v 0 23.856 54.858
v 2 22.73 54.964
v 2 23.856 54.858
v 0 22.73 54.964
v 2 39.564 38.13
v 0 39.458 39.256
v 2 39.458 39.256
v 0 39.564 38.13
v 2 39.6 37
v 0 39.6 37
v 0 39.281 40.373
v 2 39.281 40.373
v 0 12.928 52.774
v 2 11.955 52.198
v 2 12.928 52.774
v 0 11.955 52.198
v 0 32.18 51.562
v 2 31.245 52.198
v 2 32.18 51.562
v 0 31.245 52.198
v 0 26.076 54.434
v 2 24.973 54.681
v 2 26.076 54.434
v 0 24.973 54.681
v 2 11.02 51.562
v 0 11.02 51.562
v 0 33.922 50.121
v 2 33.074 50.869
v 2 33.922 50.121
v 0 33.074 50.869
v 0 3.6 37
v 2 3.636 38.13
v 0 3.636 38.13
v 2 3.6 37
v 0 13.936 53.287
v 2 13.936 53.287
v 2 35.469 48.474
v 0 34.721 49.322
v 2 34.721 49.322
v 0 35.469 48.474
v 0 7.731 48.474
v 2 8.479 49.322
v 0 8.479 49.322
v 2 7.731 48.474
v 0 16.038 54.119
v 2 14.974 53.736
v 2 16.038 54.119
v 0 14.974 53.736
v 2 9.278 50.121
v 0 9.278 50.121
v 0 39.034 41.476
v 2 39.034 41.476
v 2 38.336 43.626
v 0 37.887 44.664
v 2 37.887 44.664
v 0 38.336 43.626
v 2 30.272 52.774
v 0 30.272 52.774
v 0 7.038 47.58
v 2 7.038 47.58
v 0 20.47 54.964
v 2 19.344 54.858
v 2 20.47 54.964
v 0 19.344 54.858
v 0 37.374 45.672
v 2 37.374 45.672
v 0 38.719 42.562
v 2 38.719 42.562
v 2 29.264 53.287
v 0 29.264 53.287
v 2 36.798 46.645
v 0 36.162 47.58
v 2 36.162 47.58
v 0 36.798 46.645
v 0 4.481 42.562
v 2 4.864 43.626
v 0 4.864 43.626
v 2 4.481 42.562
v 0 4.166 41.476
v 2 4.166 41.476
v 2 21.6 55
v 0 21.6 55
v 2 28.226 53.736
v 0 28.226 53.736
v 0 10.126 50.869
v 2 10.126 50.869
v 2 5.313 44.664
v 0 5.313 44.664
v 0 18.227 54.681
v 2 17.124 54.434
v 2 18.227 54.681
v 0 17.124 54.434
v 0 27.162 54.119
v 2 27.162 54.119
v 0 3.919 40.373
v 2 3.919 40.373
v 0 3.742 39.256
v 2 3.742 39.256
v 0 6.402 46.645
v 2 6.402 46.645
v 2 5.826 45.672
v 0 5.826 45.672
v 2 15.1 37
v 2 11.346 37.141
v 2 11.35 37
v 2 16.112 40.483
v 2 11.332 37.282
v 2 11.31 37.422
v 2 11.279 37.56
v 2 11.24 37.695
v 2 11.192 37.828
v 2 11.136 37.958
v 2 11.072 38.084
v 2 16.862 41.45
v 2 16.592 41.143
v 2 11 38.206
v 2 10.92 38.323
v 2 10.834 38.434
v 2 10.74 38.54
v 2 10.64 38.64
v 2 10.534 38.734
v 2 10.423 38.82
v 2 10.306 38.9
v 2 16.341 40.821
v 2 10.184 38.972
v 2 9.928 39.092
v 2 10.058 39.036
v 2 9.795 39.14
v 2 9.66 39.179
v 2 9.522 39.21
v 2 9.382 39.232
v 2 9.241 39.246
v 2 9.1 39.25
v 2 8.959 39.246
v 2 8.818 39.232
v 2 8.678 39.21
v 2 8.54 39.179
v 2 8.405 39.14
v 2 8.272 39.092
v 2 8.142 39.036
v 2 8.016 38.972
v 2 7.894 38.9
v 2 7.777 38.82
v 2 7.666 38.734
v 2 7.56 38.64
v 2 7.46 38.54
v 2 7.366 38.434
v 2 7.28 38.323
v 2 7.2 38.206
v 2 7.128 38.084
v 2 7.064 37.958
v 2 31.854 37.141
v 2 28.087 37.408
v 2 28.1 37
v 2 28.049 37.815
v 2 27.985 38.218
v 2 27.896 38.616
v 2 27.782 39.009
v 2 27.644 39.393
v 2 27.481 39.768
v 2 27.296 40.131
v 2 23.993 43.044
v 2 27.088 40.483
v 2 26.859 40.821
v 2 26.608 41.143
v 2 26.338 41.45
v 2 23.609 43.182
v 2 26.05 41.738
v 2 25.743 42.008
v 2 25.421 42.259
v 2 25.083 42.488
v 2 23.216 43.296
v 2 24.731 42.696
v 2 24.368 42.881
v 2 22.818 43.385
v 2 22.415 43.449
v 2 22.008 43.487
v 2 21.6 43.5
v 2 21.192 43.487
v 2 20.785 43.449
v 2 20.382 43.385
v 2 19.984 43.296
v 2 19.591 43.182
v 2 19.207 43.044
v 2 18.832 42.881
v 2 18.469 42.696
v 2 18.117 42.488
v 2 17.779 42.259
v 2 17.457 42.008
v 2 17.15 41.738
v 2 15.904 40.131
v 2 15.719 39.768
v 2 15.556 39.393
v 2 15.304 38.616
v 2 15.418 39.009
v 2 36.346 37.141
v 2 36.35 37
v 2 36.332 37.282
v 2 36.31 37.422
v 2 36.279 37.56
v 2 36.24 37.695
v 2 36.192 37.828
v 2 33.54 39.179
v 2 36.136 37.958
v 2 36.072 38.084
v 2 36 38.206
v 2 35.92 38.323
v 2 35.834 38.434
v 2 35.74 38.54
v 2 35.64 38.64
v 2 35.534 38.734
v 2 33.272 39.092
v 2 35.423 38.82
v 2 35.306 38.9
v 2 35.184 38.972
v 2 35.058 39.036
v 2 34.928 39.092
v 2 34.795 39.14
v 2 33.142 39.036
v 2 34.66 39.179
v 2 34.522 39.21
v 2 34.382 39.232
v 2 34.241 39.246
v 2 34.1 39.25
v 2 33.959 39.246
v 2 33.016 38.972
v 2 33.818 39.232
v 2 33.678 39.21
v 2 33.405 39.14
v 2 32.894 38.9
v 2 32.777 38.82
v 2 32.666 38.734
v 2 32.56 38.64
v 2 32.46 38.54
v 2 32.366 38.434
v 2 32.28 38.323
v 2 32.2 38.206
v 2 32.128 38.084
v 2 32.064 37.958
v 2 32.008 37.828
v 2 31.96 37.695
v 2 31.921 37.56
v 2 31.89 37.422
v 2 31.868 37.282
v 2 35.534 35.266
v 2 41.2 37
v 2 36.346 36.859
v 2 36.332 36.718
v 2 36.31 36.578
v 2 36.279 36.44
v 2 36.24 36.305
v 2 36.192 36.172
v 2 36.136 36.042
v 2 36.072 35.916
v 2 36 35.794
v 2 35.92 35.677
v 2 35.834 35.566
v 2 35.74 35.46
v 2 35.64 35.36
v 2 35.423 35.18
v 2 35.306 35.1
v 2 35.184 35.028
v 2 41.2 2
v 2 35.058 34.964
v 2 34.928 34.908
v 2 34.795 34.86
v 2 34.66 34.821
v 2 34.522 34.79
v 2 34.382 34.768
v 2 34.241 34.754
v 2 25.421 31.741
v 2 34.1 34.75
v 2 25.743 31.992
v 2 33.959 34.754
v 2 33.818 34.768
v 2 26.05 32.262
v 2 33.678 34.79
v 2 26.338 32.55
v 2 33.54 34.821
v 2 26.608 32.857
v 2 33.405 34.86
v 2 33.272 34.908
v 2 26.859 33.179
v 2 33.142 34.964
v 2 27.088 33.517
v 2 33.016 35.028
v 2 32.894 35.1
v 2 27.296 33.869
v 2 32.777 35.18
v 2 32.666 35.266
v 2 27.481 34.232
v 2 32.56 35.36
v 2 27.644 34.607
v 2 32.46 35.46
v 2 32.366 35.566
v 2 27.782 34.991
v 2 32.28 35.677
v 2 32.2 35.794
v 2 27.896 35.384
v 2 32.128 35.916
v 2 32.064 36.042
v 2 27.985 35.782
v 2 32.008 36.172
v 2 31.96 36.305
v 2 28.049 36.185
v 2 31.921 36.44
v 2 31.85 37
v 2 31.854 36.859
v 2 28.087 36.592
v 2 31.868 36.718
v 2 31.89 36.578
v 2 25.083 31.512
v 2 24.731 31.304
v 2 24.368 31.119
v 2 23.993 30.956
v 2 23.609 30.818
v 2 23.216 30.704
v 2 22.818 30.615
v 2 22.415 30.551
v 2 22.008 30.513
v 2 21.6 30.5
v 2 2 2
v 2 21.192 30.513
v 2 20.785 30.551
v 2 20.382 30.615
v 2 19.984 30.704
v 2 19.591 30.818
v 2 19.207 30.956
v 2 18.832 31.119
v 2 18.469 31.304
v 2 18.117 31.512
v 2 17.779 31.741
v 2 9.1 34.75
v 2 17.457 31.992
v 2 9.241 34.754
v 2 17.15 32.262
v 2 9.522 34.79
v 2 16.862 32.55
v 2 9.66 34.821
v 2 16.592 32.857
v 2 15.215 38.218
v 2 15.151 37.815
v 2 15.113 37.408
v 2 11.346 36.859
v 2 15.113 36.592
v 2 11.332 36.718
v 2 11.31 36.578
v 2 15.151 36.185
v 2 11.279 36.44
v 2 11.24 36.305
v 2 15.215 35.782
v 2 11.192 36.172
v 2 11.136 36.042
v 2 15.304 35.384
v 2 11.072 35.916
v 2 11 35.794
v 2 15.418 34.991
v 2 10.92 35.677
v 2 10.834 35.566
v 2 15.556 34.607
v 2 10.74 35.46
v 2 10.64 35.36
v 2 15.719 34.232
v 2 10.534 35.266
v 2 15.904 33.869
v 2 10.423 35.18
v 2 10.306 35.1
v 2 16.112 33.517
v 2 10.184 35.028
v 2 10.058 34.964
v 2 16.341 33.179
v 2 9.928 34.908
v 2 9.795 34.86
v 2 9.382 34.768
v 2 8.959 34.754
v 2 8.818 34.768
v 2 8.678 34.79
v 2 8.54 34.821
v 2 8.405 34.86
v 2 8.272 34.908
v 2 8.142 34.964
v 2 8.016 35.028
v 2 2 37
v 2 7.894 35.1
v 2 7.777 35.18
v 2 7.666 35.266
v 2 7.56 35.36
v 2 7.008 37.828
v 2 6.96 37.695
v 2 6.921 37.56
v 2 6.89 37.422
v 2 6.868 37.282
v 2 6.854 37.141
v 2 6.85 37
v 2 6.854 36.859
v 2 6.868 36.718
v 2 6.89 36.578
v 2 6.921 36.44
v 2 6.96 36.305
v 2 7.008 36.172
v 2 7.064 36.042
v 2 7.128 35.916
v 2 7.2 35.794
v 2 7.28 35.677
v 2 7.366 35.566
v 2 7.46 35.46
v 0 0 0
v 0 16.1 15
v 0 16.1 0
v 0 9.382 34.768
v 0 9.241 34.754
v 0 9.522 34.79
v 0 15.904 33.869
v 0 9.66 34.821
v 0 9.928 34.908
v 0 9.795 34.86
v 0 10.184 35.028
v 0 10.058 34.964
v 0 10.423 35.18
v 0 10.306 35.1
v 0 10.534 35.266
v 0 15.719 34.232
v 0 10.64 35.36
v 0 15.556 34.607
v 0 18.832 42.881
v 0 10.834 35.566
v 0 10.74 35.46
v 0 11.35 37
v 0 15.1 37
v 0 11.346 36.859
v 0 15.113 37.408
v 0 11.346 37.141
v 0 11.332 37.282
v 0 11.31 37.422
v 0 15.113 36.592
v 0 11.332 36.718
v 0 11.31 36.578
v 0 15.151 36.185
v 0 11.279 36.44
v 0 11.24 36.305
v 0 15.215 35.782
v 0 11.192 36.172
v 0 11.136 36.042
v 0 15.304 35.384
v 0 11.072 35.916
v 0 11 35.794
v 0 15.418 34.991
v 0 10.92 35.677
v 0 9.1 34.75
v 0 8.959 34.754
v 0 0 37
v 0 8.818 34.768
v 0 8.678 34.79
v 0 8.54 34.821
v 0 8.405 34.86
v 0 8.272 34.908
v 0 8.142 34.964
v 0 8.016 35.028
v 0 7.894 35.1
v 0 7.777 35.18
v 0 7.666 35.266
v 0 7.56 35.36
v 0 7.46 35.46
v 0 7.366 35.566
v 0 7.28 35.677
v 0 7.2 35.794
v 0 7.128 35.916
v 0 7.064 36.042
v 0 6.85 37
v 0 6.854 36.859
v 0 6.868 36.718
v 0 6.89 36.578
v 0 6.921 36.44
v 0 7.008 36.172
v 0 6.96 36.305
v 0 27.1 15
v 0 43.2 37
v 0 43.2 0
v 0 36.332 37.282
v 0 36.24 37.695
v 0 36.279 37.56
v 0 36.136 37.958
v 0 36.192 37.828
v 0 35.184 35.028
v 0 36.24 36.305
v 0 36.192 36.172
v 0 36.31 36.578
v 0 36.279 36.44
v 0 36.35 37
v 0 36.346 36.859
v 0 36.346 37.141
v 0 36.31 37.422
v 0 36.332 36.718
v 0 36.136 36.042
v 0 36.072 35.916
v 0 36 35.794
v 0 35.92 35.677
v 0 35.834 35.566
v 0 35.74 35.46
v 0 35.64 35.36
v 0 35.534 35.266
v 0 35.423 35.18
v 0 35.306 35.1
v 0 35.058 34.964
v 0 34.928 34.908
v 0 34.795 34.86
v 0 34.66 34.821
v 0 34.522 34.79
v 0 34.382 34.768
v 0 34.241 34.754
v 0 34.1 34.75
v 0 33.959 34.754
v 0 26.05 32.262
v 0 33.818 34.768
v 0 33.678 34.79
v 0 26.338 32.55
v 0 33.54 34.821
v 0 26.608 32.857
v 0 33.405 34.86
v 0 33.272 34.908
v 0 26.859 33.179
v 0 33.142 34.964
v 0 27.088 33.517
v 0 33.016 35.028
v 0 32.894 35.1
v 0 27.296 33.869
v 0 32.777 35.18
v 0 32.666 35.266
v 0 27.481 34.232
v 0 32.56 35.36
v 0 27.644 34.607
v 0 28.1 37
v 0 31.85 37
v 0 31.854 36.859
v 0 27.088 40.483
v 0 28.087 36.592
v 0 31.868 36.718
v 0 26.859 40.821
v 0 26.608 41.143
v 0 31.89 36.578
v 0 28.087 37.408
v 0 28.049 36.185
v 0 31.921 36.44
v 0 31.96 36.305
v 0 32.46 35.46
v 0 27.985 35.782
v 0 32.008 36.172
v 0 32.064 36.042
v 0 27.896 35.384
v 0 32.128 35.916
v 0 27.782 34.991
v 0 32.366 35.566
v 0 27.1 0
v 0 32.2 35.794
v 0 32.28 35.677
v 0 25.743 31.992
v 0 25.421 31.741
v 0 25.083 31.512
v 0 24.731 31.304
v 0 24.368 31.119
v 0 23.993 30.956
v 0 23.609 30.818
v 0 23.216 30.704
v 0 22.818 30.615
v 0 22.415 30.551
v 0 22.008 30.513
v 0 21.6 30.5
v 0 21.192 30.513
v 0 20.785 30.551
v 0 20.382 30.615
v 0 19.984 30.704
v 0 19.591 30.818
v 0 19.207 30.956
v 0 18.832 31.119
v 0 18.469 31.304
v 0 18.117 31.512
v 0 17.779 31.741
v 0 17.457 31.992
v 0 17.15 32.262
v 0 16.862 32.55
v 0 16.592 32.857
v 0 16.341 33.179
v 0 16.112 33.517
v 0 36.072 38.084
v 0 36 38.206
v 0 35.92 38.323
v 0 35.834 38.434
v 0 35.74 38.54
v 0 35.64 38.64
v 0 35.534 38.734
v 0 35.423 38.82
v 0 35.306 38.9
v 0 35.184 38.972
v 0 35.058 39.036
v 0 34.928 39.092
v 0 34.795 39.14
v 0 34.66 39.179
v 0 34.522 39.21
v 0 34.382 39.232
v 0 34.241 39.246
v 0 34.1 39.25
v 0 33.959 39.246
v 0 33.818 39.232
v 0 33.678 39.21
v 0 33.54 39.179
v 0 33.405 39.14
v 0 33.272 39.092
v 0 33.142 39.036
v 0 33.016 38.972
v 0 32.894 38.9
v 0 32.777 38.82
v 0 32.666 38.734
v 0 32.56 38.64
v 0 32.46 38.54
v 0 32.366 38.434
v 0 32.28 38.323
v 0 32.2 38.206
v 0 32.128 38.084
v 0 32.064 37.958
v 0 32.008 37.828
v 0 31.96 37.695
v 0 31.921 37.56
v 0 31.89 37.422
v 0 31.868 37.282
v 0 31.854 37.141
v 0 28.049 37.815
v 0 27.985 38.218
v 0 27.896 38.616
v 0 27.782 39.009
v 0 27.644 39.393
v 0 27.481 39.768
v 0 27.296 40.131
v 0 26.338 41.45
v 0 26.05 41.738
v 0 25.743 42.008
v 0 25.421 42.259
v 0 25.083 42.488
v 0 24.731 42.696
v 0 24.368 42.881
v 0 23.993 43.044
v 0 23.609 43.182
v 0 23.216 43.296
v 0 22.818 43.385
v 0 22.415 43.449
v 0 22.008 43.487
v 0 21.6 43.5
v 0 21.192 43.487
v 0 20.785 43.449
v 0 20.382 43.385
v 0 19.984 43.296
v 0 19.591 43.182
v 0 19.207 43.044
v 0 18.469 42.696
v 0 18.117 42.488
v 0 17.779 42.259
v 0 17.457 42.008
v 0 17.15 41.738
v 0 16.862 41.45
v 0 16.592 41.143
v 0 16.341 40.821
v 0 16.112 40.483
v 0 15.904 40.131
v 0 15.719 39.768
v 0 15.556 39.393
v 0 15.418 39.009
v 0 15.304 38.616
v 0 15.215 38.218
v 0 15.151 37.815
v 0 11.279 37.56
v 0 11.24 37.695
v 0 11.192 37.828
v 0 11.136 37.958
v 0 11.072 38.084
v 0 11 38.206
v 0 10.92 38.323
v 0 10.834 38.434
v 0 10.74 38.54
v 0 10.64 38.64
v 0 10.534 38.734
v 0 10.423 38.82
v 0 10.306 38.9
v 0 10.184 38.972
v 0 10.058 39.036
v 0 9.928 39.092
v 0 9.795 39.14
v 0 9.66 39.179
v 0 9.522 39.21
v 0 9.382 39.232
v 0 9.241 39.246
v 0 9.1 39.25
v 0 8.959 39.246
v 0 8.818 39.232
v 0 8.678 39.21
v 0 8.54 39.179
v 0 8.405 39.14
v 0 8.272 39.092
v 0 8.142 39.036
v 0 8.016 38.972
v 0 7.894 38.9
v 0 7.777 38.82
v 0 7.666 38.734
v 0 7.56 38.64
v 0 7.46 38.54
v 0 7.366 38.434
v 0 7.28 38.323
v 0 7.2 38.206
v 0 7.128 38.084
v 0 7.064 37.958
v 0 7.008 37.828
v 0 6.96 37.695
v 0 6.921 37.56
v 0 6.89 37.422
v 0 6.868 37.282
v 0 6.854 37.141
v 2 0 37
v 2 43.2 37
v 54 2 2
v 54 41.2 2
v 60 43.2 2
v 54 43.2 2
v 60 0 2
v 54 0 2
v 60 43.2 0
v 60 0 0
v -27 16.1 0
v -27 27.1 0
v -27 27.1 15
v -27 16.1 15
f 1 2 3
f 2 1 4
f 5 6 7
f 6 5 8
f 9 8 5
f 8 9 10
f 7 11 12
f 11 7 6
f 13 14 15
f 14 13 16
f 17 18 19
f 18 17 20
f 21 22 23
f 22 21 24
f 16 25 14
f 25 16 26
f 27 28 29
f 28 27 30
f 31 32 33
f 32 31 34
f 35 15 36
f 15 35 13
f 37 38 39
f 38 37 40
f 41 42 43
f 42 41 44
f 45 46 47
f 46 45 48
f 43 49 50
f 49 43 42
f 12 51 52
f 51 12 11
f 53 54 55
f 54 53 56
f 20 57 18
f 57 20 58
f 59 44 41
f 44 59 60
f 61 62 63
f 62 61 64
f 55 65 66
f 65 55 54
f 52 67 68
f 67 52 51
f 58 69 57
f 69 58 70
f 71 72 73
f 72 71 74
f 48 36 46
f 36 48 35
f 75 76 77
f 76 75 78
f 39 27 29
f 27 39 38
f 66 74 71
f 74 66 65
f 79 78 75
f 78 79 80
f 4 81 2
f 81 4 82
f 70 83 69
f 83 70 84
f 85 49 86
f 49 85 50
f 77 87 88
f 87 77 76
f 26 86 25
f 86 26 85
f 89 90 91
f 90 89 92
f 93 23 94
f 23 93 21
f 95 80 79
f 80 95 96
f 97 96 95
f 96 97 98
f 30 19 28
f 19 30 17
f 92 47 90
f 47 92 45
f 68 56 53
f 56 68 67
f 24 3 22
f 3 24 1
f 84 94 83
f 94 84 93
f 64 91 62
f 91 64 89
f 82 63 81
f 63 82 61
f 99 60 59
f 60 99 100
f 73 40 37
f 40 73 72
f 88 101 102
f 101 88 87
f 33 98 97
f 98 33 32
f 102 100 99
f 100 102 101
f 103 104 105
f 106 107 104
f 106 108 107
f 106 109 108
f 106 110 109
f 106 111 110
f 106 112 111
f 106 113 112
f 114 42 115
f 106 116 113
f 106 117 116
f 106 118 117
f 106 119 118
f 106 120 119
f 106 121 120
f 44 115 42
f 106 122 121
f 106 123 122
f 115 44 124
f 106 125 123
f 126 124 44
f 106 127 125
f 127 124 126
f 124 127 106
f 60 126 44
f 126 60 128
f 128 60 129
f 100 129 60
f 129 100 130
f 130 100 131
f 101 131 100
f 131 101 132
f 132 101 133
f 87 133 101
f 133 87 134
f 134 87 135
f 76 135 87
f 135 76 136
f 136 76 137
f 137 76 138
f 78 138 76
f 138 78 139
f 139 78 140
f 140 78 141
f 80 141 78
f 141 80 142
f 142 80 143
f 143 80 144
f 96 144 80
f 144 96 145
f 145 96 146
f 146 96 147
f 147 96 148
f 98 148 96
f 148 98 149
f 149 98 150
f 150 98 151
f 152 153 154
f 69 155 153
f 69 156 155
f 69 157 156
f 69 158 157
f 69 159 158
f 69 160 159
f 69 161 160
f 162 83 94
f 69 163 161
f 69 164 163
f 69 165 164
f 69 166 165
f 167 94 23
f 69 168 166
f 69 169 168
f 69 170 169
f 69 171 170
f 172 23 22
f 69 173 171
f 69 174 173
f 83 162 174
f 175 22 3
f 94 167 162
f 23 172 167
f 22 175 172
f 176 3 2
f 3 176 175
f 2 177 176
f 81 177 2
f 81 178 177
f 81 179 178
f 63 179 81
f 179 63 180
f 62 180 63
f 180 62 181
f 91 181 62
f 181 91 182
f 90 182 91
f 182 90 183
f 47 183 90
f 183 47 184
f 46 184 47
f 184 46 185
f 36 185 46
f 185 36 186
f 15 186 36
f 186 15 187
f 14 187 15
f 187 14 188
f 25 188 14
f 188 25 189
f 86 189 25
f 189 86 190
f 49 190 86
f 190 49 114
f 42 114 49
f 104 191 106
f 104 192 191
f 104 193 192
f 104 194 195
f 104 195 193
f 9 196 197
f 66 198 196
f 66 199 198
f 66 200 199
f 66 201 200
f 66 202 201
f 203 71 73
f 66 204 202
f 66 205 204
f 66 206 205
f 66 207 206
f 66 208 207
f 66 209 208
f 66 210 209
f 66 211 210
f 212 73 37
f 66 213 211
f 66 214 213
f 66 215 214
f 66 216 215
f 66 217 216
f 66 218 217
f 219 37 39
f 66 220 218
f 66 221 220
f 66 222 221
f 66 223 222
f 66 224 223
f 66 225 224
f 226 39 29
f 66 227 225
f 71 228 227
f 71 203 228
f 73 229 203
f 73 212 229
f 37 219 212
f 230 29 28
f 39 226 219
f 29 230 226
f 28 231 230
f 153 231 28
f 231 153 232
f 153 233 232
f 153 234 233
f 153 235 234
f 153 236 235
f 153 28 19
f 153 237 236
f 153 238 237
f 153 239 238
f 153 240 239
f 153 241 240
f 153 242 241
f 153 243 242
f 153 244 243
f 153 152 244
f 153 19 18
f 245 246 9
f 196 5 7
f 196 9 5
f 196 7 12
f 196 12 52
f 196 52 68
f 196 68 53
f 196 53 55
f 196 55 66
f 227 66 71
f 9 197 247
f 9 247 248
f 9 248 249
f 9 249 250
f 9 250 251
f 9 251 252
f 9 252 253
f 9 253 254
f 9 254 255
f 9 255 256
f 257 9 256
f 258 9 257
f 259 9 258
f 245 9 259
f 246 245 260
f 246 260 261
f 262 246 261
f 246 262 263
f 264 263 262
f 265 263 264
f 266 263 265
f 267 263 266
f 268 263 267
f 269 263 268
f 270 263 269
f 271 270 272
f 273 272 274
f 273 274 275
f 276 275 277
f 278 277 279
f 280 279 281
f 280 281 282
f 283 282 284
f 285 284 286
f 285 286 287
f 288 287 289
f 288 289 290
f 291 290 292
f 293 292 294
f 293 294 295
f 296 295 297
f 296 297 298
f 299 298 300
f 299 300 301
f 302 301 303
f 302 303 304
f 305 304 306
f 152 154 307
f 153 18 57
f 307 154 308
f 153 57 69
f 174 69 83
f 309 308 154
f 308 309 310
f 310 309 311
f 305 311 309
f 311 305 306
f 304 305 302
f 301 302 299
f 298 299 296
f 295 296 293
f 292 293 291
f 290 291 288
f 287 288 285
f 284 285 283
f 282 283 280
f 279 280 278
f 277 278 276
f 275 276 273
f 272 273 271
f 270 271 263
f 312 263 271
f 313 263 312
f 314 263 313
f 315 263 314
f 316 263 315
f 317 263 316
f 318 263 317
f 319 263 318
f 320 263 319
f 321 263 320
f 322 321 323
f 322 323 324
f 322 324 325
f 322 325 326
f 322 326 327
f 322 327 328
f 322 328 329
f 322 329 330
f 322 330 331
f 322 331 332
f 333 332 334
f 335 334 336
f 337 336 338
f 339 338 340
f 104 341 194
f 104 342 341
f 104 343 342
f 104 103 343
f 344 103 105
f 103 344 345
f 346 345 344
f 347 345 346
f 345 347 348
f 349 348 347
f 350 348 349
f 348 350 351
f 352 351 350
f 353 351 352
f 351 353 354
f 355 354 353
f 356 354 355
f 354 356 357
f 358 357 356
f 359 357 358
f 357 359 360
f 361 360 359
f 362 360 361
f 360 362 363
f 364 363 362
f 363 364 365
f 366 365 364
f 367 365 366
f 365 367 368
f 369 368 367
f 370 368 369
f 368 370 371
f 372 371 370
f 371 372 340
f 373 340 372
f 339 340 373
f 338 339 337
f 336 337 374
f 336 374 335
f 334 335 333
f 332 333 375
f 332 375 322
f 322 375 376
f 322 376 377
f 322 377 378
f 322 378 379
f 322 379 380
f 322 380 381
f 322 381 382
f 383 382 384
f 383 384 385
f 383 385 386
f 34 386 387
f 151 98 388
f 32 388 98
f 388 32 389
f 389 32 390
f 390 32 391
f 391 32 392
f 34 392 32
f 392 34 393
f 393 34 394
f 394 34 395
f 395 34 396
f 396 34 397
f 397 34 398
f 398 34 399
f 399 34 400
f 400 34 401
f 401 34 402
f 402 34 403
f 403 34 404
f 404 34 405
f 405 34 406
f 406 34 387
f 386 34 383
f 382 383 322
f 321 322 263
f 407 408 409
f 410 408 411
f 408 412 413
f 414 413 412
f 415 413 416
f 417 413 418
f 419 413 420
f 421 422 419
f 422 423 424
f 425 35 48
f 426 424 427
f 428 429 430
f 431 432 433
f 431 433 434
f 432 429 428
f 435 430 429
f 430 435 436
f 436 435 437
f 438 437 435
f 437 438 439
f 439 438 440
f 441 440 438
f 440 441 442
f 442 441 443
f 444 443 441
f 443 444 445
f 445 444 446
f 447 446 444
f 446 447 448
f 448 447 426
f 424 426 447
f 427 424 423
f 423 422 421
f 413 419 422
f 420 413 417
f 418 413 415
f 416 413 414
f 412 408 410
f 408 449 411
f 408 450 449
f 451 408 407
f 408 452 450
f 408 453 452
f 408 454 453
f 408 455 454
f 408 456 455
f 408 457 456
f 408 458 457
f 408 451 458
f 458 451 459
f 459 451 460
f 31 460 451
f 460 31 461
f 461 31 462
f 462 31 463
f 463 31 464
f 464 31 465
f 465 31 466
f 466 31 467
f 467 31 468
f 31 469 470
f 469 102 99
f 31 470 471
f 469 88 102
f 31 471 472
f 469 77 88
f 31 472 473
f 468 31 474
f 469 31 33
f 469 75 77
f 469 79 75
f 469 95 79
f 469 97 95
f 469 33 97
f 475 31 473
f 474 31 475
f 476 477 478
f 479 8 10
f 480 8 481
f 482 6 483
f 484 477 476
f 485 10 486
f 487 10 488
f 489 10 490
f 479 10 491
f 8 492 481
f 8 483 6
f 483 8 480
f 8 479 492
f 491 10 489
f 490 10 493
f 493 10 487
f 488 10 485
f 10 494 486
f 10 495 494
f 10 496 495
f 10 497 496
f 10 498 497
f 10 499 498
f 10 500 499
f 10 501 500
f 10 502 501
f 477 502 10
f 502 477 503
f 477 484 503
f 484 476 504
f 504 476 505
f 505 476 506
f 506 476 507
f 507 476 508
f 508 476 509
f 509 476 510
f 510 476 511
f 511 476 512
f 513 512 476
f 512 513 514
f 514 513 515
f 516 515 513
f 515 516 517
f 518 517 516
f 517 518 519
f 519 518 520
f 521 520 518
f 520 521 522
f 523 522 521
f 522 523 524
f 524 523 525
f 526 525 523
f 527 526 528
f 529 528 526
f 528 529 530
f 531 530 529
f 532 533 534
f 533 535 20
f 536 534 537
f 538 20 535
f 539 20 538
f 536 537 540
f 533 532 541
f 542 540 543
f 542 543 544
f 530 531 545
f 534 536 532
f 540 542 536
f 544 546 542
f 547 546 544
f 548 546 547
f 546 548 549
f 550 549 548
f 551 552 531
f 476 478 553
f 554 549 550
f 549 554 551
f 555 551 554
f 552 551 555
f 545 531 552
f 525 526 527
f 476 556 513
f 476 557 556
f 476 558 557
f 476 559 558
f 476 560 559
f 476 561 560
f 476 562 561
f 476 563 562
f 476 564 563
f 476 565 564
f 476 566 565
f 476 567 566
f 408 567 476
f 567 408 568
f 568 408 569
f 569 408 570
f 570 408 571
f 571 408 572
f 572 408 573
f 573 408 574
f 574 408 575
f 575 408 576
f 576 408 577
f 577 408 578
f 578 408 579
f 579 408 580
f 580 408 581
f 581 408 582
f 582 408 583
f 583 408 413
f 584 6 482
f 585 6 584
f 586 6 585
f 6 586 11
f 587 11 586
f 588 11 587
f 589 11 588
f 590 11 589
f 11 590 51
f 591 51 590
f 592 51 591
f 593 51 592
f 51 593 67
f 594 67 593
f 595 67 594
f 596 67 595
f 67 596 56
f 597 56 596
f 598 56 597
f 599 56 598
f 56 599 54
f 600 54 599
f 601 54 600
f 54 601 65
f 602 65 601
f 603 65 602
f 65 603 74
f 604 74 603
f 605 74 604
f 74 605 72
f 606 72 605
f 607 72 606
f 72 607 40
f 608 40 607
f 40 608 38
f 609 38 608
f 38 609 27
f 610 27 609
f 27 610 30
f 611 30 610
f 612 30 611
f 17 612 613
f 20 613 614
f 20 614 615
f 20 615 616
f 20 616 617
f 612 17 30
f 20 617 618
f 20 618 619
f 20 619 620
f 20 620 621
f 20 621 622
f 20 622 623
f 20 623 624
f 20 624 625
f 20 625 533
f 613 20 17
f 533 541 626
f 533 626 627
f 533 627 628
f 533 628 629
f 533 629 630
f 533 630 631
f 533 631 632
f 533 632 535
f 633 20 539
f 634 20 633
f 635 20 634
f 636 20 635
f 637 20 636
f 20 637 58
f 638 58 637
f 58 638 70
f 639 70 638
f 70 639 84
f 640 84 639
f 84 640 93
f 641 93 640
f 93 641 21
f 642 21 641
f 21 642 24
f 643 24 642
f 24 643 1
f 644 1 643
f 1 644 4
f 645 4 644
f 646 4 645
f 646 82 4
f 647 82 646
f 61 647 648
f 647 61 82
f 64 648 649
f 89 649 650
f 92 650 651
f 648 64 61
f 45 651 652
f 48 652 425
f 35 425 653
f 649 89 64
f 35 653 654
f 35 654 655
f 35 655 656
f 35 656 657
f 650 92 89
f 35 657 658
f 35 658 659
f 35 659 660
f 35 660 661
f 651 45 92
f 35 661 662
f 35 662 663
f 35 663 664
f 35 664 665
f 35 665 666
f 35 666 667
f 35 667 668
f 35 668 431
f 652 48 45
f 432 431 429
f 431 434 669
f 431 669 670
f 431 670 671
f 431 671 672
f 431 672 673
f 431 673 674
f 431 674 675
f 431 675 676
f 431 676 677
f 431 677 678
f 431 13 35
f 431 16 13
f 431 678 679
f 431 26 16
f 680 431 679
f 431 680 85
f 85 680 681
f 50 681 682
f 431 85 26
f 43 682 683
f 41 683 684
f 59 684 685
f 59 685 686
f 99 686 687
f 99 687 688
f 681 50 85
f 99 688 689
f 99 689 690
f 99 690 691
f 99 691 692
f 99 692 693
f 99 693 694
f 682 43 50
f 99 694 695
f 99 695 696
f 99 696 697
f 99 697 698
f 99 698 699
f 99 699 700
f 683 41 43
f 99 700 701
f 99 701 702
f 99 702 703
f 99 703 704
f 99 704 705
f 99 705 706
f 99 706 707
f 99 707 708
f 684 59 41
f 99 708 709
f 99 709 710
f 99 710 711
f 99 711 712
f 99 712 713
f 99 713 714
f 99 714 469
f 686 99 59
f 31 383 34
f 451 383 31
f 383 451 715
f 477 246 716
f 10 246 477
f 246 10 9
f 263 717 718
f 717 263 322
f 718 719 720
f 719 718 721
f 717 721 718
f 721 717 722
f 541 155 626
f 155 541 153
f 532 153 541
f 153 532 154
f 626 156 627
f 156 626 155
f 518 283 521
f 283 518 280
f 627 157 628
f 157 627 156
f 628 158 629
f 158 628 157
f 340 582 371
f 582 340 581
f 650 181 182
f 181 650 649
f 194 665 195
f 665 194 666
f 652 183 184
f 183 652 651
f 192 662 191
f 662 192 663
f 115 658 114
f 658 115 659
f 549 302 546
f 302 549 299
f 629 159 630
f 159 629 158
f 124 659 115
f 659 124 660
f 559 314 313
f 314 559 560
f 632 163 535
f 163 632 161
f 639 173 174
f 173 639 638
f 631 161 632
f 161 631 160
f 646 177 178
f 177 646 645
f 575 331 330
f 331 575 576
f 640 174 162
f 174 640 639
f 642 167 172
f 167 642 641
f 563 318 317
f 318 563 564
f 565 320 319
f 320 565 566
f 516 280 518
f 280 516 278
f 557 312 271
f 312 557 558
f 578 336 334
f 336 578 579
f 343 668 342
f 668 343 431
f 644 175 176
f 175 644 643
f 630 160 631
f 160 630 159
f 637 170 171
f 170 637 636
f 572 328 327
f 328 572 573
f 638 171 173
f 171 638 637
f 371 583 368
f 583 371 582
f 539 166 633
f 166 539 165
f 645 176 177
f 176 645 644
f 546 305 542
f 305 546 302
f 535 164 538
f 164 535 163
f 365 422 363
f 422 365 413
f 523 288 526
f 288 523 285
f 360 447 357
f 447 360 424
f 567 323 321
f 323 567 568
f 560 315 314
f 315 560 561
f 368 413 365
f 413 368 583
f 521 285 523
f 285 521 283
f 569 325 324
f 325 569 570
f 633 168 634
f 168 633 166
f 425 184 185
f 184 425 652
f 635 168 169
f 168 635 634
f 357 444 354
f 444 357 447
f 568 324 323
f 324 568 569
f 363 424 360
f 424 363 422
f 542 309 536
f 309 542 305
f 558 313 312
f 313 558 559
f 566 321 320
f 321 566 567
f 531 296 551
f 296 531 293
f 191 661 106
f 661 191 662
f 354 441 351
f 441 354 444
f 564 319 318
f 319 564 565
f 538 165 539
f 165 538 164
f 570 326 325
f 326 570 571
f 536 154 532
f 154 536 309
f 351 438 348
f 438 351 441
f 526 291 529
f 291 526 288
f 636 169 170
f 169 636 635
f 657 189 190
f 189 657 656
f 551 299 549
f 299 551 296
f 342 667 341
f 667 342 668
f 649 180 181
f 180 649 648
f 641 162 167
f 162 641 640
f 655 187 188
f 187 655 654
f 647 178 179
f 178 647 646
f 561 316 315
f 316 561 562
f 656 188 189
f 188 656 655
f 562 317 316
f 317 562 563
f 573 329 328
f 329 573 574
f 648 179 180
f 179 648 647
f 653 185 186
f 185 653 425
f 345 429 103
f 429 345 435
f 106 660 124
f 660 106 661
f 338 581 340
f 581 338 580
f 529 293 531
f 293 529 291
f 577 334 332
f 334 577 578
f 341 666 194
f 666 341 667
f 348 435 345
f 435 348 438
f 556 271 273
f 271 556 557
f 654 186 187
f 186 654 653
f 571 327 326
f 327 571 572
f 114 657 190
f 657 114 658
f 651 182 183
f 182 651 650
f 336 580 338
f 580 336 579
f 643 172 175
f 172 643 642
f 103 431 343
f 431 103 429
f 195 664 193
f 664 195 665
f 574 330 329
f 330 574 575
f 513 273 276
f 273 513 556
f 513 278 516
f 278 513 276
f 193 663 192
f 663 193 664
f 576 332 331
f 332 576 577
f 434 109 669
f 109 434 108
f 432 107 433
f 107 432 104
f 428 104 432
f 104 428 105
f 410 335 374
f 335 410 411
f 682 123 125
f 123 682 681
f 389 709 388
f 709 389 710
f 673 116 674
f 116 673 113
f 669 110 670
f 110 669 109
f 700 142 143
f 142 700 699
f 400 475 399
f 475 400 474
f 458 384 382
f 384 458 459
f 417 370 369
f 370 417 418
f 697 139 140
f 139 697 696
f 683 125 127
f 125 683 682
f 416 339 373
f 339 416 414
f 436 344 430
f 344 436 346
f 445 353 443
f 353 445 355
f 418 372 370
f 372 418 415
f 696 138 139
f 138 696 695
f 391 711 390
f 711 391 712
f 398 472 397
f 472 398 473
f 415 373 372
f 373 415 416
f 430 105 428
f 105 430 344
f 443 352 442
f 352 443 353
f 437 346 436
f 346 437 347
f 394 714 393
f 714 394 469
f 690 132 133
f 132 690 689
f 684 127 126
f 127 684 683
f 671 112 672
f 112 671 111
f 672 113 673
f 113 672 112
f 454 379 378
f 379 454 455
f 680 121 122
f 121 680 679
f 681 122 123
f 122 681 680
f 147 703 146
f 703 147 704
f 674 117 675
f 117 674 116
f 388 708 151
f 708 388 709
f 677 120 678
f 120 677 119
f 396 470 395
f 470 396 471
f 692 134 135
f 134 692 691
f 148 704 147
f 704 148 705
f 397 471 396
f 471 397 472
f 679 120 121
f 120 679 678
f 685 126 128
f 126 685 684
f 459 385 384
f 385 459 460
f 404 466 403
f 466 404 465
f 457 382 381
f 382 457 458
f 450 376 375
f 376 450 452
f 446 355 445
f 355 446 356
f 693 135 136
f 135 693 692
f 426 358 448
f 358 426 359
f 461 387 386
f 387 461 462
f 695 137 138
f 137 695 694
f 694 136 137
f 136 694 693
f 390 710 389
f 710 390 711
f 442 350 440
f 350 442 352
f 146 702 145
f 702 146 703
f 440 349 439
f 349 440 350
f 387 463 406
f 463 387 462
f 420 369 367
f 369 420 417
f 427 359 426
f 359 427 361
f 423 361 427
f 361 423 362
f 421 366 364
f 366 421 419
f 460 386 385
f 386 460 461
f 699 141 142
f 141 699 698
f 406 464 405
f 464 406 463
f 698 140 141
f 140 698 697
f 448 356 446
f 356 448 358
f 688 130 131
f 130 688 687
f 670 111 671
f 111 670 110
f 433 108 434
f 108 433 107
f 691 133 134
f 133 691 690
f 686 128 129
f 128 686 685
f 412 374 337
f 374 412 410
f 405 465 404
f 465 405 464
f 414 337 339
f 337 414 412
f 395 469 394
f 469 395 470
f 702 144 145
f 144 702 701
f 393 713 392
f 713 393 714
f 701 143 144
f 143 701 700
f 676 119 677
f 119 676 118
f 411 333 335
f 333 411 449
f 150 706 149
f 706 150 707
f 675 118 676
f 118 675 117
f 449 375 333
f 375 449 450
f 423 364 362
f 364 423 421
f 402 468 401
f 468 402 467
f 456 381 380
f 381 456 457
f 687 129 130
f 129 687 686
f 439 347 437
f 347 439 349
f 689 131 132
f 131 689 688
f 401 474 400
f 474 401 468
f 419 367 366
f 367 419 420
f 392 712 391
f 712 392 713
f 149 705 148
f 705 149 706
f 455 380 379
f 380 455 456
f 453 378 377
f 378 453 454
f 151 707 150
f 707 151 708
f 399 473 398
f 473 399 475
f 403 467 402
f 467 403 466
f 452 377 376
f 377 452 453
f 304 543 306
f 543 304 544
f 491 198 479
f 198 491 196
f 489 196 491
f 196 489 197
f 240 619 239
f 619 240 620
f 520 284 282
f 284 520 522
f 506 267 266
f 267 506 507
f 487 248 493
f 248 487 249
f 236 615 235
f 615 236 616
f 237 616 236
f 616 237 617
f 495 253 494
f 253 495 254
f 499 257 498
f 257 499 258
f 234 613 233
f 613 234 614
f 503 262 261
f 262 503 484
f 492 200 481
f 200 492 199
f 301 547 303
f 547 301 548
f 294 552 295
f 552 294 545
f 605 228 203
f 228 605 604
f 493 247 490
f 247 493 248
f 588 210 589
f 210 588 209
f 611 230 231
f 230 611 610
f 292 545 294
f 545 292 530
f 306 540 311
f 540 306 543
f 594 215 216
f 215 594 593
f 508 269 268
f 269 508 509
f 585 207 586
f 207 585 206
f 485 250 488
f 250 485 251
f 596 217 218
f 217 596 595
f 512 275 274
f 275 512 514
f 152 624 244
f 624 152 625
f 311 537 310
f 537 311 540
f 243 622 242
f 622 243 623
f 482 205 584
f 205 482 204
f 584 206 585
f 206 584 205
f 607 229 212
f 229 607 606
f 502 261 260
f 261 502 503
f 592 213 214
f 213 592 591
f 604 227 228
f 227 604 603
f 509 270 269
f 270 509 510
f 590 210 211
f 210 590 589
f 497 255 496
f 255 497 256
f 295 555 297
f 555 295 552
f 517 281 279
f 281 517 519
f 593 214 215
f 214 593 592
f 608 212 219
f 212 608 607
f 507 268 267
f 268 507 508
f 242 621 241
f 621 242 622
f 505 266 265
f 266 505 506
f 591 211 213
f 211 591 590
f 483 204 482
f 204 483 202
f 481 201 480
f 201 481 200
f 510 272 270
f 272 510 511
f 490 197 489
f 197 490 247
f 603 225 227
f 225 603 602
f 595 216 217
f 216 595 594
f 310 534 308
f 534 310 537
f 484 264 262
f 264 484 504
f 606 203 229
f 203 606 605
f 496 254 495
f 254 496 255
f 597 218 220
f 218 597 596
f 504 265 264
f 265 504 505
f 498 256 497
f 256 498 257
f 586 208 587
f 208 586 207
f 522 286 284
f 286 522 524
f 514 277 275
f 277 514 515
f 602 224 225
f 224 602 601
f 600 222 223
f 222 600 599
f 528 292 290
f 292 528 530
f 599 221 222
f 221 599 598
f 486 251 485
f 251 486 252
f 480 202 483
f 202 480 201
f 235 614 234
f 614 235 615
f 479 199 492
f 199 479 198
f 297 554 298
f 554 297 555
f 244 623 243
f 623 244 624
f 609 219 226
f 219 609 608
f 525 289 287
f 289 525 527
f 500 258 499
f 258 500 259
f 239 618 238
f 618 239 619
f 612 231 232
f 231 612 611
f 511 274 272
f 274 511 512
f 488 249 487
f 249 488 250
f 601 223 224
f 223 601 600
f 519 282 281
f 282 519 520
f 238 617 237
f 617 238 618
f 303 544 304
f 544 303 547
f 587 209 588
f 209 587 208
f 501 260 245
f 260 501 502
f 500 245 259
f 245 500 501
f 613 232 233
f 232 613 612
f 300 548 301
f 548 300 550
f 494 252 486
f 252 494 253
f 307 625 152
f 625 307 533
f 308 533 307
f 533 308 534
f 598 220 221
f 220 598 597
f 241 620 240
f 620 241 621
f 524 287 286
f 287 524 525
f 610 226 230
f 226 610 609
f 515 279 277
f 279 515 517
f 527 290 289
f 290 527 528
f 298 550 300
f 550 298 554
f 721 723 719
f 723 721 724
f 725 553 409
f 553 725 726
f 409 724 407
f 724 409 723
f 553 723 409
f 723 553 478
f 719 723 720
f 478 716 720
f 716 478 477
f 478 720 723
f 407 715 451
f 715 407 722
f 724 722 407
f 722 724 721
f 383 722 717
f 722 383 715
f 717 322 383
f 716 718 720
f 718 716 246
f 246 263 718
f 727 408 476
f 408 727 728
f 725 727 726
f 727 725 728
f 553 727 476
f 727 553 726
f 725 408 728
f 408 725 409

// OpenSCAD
mounting_hole_distance = 25;
motor_diameter = 36;
shaft_protrusion_diameter = 13;
shaft_protrusion_height = 4.6;
shaft_diameter = 3.2;
motor_length = 50;
wall_thickness = 2;

base_plate_length = motor_length * 1.2;
base_plate_width = motor_diameter * 1.2;
mounting_hole_hight = motor_diameter /2;

lichtschranke_platine_laenge = 33;
lichtschranke_platine_breite = 11;
lichtschranke_boden_clearance = 15;
lichtschranke_stecker_laenge = 6;

$fn = 100;
union(){
cube([base_plate_length, base_plate_width, wall_thickness]);
rear_side_plate_start = base_plate_length * 0.9;
side_plate_height = 15 + 20;

translate([0, wall_thickness, wall_thickness])rotate([90, 0, 0])linear_extrude(wall_thickness)polygon([[0, 0], [rear_side_plate_start, 0], [wall_thickness, side_plate_height], [0, side_plate_height]]);
translate([0, base_plate_width, wall_thickness])rotate([90, 0, 0])linear_extrude(wall_thickness)polygon([[0, 0], [rear_side_plate_start, 0], [wall_thickness, side_plate_height], [0, side_plate_height]]);
translate([0, base_plate_width/2, wall_thickness])rotate([0, 0, 90])rotate([90, 0, 0])difference(){
	union(){
		translate([0, side_plate_height, 0])cylinder(h=wall_thickness, d=motor_diameter);
		translate([-base_plate_width/2, 0, 0])cube([base_plate_width, side_plate_height, wall_thickness]);
	}
	union(){
	translate([0, side_plate_height, 0])cylinder(h=wall_thickness, d=shaft_protrusion_diameter);
	translate([- mounting_hole_distance/2, side_plate_height, 0])cylinder(h=wall_thickness, d=4.5);
	translate([+ mounting_hole_distance/2, side_plate_height, 0])cylinder(h=wall_thickness, d=4.5);
	}
}
translate([-lichtschranke_platine_laenge + lichtschranke_stecker_laenge, base_plate_width/2 - lichtschranke_platine_breite/2, 0])
	cube([lichtschranke_platine_laenge - lichtschranke_stecker_laenge, lichtschranke_platine_breite, lichtschranke_boden_clearance]);
}
